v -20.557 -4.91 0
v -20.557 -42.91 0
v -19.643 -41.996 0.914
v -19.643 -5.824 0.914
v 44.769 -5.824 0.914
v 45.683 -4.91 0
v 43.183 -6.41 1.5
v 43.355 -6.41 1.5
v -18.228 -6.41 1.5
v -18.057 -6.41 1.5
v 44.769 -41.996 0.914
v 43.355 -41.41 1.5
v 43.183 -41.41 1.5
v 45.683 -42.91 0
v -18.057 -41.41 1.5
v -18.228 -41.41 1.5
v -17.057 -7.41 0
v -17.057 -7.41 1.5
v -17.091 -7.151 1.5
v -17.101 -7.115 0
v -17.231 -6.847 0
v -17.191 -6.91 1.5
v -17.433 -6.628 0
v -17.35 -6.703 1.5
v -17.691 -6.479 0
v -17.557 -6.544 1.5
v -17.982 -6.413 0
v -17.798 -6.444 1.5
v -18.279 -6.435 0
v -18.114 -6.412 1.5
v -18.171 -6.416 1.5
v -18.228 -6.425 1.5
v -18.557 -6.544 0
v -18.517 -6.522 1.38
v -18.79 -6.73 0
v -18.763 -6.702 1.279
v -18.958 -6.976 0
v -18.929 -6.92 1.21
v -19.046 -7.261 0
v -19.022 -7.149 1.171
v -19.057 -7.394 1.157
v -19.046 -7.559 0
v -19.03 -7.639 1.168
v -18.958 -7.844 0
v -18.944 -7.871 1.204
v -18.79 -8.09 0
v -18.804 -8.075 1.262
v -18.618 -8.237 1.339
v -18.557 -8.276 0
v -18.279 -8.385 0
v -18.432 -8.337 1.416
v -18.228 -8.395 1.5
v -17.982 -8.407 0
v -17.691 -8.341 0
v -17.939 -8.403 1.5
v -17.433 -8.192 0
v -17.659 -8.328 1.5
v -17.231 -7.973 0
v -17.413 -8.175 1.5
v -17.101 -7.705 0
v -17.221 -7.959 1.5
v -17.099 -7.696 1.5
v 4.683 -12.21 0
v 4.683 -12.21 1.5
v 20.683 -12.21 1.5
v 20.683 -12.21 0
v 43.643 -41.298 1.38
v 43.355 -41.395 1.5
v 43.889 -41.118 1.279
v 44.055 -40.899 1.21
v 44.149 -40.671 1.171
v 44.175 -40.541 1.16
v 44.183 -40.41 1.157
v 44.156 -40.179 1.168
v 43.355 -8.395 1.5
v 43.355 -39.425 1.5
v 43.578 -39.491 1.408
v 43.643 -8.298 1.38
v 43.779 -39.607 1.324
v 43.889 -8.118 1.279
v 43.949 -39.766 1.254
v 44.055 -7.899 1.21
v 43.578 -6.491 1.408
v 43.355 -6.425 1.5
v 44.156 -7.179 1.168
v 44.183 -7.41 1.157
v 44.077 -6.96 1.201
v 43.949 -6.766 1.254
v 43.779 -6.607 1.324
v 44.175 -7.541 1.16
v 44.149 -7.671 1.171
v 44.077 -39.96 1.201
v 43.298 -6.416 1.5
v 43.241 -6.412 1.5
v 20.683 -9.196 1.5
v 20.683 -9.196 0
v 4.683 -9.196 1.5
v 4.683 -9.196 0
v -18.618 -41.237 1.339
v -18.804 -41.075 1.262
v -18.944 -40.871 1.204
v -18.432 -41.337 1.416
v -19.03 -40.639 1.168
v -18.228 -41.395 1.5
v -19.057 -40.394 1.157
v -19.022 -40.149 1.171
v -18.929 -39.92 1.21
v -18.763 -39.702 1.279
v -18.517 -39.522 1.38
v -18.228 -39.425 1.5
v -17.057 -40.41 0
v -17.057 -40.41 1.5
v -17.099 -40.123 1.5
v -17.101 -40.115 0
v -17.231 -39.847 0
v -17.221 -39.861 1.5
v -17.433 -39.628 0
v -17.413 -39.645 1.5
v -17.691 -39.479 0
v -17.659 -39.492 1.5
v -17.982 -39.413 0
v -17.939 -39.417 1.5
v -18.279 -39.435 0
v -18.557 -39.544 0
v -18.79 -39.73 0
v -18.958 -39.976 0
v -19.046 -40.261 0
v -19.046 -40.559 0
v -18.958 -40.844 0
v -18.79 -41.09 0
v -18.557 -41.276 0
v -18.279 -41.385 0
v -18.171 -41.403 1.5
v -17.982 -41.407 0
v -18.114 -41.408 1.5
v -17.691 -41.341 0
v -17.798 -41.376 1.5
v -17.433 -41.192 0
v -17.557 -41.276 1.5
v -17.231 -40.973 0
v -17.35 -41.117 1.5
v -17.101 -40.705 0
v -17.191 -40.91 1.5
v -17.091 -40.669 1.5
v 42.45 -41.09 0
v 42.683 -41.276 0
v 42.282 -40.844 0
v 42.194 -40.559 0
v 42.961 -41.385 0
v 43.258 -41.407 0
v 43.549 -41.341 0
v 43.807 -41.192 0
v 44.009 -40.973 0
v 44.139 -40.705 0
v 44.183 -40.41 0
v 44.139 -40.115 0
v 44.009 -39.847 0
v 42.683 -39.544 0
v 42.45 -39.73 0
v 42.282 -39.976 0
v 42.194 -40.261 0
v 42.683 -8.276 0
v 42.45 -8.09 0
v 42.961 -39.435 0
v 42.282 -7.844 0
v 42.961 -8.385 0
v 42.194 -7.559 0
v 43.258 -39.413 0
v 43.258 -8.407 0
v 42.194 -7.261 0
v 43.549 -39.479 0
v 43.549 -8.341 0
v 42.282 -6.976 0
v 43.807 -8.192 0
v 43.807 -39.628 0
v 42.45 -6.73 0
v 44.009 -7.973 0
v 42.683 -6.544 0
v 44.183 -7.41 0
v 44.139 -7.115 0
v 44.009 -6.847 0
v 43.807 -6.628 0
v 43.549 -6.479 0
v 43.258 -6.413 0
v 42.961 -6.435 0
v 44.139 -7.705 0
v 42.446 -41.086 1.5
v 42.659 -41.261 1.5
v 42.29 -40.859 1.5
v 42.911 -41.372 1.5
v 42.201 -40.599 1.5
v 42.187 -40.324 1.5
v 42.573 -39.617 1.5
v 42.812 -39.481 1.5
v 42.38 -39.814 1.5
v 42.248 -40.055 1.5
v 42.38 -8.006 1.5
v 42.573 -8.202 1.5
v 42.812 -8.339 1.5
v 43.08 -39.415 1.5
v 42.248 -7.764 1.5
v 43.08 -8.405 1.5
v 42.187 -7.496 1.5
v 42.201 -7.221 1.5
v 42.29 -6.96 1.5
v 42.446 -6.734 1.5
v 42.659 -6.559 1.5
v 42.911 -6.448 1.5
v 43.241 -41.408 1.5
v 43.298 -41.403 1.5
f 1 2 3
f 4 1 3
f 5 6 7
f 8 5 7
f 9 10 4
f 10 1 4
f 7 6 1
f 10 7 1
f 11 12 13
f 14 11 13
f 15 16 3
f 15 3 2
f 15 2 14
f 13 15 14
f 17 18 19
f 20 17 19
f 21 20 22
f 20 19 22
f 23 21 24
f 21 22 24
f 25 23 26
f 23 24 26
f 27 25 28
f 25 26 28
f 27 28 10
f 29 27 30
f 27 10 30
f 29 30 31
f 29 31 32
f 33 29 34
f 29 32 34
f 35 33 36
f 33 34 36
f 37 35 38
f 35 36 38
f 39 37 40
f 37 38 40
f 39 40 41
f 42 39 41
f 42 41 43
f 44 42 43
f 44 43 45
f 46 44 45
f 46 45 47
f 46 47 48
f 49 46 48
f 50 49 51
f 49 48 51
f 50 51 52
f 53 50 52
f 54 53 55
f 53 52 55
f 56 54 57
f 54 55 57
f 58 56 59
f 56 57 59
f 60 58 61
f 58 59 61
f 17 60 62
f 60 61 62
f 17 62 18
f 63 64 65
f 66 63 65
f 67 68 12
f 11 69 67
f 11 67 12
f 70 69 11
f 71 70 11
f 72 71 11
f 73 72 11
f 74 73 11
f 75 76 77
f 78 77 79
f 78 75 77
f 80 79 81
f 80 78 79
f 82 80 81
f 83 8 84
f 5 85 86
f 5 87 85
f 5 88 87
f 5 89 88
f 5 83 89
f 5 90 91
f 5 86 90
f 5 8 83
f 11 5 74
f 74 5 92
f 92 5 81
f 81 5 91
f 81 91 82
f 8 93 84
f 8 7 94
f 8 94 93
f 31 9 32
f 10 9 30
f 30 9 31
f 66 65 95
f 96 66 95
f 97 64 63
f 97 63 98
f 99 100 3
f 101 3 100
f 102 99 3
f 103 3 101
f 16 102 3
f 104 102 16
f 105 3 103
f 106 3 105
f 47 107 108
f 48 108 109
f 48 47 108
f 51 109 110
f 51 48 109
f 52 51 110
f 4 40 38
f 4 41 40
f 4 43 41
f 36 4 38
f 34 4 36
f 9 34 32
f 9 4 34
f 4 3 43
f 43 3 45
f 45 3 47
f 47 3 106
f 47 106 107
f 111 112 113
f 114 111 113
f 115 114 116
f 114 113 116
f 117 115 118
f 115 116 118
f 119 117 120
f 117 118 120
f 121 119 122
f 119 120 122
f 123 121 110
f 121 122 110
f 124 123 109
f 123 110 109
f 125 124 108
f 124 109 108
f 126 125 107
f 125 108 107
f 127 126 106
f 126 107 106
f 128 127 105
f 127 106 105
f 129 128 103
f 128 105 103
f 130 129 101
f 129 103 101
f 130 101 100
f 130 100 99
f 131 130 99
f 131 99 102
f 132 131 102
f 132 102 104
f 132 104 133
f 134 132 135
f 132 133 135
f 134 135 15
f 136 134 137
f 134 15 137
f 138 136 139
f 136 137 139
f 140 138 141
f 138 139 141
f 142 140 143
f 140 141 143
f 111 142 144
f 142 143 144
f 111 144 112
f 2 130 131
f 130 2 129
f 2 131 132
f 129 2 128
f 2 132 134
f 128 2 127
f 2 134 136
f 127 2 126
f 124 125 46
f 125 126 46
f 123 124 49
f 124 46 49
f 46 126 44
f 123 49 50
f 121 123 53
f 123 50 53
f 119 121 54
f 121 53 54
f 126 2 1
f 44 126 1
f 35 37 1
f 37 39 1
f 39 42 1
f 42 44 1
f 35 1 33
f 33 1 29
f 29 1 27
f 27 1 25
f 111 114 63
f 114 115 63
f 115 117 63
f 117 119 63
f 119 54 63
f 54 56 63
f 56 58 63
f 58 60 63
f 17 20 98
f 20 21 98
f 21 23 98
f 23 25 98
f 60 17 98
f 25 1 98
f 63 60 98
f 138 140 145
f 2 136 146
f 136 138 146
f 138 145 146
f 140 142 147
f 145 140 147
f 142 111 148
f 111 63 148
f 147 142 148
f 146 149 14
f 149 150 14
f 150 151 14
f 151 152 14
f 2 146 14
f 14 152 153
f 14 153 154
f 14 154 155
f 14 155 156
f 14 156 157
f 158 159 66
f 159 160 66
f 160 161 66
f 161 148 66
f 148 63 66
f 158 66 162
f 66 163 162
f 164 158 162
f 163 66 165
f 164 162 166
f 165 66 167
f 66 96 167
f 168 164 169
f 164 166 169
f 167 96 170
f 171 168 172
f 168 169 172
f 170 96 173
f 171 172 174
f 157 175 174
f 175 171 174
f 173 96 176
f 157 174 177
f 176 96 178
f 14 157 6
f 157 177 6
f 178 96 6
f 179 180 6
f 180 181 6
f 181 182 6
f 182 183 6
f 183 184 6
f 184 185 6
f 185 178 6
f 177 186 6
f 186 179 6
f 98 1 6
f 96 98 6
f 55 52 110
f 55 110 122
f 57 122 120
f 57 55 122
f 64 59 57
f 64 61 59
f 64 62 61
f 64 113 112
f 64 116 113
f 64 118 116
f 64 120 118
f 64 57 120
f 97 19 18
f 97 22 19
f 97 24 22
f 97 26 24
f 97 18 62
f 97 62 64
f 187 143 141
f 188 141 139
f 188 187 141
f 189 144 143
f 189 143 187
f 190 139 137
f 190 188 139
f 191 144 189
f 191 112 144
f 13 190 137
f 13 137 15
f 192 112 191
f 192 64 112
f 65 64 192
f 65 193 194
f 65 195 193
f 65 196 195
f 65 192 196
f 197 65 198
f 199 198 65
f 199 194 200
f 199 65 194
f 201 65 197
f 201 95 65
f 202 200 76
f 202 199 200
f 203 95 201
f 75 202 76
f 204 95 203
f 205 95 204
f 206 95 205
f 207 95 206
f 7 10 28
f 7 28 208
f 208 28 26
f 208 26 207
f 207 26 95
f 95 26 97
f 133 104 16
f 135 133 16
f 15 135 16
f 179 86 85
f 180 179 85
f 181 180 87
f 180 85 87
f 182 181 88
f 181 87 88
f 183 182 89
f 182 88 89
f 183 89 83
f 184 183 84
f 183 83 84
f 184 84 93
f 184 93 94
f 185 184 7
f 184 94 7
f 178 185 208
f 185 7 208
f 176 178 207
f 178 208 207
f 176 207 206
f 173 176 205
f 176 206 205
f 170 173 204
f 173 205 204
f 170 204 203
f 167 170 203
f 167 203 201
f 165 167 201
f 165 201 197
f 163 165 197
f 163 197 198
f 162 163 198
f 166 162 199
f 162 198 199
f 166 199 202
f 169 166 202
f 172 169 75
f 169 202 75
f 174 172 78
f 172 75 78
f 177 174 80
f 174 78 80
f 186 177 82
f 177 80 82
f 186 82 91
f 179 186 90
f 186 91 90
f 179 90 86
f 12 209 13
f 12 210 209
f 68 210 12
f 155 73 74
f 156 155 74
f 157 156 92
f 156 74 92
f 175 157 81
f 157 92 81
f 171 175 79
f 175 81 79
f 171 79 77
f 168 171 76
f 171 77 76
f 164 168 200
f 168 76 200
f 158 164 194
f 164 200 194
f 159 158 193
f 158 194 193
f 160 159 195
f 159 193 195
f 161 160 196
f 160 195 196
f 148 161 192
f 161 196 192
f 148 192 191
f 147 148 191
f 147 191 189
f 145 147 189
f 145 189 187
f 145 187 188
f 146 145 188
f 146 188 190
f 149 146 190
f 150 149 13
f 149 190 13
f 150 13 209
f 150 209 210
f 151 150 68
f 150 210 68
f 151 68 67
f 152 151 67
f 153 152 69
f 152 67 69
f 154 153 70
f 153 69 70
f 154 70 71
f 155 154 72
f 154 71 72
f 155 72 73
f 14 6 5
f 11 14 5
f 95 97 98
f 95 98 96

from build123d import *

# Parameters (mm, degrees)
F0_W        = 67.24
F0_H        = 39
F1_DEPTH    = 1.5
F2_T1_DEPTH = 49.2867319519
F3_T1_DEPTH = 73.5267319519
F3_T3_DEPTH = 43.5142834408
F4_R        = 1
F5_DEPTH    = 2
F6_W        = 16
F6_H        = 3.0143252599
F7_DEPTH    = 2


# Not quite as in the source:
# - a fillet or chamfer that OpenCascade refuses, or shapes differently, is made with other operations: its cross-section is extruded or revolved along the edge and cut away or added


with BuildPart() as f1:
    # F0 (on Top) → F1 (new body)
    with BuildSketch(Plane.XY):
        with Locations((12.5632099807, -23.9098862686)):
            Rectangle(F0_W, F0_H)
    extrude(amount=F1_DEPTH)

    # F2: chamfer of 2 on 2 edges, made by hand

    # F2_s2 → F2_t1 (cut)
    with BuildSketch(Plane.XZ.offset(-0.7334797074)):
        Polygon((46.1832099807, -0.5), (44.1832099807, 1.5), (46.1832099807, 1.5), align=None)
        Polygon((-21.0567900193, -0.5), (-19.0567900193, 1.5), (-21.0567900193, 1.5), align=None)
    extrude(amount=F2_T1_DEPTH, mode=Mode.SUBTRACT)

    # F3: chamfer of 2 on 4 edges, made by hand

    # F3_s2 → F3_t1 (cut)
    with BuildSketch(Plane.YZ.offset(-24.2001559952)):
        Polygon((-4.4098862686, -0.5), (-6.4098862686, 1.5), (-4.4098862686, 1.5), align=None)
        Polygon((-41.4098862686, 1.5), (-43.4098862686, -0.5), (-43.4098862686, 1.5), align=None)
    extrude(amount=F3_T1_DEPTH, mode=Mode.SUBTRACT)

    # F3_s4 → F3_t3 (cut)
    with BuildSketch(Plane.XZ.offset(2.1527445482)):
        Polygon((43.354782856, 1.5), (44.7689964183, 0.9142135624), (44.1832099807, 1.5), align=None)
        Polygon((-19.6425764569, 0.9142135624), (-18.2283628946, 1.5), (-19.0567900193, 1.5), align=None)
    extrude(amount=F3_T3_DEPTH, mode=Mode.SUBTRACT)

    # F4 (on face) → F5 (cut)
    with BuildSketch(Plane.XY.offset(1.5)):
        with Locations((43.1832099807, -40.4098862686)):
            Circle(F4_R)
        with Locations((43.1832099807, -7.4098862686)):
            Circle(F4_R)
        with Locations((-18.0567900193, -40.4098862686)):
            Circle(F4_R)
        with Locations((-18.0567900193, -7.4098862686)):
            Circle(F4_R)
    extrude(amount=-F5_DEPTH, mode=Mode.SUBTRACT)

    # F6 (on face) → F7 (cut)
    with BuildSketch(Plane.XY.offset(1.5)):
        with Locations((12.6832099807, -10.7027236386)):
            Rectangle(F6_W, F6_H)
    extrude(amount=-F7_DEPTH, mode=Mode.SUBTRACT)


solid = f1.part
